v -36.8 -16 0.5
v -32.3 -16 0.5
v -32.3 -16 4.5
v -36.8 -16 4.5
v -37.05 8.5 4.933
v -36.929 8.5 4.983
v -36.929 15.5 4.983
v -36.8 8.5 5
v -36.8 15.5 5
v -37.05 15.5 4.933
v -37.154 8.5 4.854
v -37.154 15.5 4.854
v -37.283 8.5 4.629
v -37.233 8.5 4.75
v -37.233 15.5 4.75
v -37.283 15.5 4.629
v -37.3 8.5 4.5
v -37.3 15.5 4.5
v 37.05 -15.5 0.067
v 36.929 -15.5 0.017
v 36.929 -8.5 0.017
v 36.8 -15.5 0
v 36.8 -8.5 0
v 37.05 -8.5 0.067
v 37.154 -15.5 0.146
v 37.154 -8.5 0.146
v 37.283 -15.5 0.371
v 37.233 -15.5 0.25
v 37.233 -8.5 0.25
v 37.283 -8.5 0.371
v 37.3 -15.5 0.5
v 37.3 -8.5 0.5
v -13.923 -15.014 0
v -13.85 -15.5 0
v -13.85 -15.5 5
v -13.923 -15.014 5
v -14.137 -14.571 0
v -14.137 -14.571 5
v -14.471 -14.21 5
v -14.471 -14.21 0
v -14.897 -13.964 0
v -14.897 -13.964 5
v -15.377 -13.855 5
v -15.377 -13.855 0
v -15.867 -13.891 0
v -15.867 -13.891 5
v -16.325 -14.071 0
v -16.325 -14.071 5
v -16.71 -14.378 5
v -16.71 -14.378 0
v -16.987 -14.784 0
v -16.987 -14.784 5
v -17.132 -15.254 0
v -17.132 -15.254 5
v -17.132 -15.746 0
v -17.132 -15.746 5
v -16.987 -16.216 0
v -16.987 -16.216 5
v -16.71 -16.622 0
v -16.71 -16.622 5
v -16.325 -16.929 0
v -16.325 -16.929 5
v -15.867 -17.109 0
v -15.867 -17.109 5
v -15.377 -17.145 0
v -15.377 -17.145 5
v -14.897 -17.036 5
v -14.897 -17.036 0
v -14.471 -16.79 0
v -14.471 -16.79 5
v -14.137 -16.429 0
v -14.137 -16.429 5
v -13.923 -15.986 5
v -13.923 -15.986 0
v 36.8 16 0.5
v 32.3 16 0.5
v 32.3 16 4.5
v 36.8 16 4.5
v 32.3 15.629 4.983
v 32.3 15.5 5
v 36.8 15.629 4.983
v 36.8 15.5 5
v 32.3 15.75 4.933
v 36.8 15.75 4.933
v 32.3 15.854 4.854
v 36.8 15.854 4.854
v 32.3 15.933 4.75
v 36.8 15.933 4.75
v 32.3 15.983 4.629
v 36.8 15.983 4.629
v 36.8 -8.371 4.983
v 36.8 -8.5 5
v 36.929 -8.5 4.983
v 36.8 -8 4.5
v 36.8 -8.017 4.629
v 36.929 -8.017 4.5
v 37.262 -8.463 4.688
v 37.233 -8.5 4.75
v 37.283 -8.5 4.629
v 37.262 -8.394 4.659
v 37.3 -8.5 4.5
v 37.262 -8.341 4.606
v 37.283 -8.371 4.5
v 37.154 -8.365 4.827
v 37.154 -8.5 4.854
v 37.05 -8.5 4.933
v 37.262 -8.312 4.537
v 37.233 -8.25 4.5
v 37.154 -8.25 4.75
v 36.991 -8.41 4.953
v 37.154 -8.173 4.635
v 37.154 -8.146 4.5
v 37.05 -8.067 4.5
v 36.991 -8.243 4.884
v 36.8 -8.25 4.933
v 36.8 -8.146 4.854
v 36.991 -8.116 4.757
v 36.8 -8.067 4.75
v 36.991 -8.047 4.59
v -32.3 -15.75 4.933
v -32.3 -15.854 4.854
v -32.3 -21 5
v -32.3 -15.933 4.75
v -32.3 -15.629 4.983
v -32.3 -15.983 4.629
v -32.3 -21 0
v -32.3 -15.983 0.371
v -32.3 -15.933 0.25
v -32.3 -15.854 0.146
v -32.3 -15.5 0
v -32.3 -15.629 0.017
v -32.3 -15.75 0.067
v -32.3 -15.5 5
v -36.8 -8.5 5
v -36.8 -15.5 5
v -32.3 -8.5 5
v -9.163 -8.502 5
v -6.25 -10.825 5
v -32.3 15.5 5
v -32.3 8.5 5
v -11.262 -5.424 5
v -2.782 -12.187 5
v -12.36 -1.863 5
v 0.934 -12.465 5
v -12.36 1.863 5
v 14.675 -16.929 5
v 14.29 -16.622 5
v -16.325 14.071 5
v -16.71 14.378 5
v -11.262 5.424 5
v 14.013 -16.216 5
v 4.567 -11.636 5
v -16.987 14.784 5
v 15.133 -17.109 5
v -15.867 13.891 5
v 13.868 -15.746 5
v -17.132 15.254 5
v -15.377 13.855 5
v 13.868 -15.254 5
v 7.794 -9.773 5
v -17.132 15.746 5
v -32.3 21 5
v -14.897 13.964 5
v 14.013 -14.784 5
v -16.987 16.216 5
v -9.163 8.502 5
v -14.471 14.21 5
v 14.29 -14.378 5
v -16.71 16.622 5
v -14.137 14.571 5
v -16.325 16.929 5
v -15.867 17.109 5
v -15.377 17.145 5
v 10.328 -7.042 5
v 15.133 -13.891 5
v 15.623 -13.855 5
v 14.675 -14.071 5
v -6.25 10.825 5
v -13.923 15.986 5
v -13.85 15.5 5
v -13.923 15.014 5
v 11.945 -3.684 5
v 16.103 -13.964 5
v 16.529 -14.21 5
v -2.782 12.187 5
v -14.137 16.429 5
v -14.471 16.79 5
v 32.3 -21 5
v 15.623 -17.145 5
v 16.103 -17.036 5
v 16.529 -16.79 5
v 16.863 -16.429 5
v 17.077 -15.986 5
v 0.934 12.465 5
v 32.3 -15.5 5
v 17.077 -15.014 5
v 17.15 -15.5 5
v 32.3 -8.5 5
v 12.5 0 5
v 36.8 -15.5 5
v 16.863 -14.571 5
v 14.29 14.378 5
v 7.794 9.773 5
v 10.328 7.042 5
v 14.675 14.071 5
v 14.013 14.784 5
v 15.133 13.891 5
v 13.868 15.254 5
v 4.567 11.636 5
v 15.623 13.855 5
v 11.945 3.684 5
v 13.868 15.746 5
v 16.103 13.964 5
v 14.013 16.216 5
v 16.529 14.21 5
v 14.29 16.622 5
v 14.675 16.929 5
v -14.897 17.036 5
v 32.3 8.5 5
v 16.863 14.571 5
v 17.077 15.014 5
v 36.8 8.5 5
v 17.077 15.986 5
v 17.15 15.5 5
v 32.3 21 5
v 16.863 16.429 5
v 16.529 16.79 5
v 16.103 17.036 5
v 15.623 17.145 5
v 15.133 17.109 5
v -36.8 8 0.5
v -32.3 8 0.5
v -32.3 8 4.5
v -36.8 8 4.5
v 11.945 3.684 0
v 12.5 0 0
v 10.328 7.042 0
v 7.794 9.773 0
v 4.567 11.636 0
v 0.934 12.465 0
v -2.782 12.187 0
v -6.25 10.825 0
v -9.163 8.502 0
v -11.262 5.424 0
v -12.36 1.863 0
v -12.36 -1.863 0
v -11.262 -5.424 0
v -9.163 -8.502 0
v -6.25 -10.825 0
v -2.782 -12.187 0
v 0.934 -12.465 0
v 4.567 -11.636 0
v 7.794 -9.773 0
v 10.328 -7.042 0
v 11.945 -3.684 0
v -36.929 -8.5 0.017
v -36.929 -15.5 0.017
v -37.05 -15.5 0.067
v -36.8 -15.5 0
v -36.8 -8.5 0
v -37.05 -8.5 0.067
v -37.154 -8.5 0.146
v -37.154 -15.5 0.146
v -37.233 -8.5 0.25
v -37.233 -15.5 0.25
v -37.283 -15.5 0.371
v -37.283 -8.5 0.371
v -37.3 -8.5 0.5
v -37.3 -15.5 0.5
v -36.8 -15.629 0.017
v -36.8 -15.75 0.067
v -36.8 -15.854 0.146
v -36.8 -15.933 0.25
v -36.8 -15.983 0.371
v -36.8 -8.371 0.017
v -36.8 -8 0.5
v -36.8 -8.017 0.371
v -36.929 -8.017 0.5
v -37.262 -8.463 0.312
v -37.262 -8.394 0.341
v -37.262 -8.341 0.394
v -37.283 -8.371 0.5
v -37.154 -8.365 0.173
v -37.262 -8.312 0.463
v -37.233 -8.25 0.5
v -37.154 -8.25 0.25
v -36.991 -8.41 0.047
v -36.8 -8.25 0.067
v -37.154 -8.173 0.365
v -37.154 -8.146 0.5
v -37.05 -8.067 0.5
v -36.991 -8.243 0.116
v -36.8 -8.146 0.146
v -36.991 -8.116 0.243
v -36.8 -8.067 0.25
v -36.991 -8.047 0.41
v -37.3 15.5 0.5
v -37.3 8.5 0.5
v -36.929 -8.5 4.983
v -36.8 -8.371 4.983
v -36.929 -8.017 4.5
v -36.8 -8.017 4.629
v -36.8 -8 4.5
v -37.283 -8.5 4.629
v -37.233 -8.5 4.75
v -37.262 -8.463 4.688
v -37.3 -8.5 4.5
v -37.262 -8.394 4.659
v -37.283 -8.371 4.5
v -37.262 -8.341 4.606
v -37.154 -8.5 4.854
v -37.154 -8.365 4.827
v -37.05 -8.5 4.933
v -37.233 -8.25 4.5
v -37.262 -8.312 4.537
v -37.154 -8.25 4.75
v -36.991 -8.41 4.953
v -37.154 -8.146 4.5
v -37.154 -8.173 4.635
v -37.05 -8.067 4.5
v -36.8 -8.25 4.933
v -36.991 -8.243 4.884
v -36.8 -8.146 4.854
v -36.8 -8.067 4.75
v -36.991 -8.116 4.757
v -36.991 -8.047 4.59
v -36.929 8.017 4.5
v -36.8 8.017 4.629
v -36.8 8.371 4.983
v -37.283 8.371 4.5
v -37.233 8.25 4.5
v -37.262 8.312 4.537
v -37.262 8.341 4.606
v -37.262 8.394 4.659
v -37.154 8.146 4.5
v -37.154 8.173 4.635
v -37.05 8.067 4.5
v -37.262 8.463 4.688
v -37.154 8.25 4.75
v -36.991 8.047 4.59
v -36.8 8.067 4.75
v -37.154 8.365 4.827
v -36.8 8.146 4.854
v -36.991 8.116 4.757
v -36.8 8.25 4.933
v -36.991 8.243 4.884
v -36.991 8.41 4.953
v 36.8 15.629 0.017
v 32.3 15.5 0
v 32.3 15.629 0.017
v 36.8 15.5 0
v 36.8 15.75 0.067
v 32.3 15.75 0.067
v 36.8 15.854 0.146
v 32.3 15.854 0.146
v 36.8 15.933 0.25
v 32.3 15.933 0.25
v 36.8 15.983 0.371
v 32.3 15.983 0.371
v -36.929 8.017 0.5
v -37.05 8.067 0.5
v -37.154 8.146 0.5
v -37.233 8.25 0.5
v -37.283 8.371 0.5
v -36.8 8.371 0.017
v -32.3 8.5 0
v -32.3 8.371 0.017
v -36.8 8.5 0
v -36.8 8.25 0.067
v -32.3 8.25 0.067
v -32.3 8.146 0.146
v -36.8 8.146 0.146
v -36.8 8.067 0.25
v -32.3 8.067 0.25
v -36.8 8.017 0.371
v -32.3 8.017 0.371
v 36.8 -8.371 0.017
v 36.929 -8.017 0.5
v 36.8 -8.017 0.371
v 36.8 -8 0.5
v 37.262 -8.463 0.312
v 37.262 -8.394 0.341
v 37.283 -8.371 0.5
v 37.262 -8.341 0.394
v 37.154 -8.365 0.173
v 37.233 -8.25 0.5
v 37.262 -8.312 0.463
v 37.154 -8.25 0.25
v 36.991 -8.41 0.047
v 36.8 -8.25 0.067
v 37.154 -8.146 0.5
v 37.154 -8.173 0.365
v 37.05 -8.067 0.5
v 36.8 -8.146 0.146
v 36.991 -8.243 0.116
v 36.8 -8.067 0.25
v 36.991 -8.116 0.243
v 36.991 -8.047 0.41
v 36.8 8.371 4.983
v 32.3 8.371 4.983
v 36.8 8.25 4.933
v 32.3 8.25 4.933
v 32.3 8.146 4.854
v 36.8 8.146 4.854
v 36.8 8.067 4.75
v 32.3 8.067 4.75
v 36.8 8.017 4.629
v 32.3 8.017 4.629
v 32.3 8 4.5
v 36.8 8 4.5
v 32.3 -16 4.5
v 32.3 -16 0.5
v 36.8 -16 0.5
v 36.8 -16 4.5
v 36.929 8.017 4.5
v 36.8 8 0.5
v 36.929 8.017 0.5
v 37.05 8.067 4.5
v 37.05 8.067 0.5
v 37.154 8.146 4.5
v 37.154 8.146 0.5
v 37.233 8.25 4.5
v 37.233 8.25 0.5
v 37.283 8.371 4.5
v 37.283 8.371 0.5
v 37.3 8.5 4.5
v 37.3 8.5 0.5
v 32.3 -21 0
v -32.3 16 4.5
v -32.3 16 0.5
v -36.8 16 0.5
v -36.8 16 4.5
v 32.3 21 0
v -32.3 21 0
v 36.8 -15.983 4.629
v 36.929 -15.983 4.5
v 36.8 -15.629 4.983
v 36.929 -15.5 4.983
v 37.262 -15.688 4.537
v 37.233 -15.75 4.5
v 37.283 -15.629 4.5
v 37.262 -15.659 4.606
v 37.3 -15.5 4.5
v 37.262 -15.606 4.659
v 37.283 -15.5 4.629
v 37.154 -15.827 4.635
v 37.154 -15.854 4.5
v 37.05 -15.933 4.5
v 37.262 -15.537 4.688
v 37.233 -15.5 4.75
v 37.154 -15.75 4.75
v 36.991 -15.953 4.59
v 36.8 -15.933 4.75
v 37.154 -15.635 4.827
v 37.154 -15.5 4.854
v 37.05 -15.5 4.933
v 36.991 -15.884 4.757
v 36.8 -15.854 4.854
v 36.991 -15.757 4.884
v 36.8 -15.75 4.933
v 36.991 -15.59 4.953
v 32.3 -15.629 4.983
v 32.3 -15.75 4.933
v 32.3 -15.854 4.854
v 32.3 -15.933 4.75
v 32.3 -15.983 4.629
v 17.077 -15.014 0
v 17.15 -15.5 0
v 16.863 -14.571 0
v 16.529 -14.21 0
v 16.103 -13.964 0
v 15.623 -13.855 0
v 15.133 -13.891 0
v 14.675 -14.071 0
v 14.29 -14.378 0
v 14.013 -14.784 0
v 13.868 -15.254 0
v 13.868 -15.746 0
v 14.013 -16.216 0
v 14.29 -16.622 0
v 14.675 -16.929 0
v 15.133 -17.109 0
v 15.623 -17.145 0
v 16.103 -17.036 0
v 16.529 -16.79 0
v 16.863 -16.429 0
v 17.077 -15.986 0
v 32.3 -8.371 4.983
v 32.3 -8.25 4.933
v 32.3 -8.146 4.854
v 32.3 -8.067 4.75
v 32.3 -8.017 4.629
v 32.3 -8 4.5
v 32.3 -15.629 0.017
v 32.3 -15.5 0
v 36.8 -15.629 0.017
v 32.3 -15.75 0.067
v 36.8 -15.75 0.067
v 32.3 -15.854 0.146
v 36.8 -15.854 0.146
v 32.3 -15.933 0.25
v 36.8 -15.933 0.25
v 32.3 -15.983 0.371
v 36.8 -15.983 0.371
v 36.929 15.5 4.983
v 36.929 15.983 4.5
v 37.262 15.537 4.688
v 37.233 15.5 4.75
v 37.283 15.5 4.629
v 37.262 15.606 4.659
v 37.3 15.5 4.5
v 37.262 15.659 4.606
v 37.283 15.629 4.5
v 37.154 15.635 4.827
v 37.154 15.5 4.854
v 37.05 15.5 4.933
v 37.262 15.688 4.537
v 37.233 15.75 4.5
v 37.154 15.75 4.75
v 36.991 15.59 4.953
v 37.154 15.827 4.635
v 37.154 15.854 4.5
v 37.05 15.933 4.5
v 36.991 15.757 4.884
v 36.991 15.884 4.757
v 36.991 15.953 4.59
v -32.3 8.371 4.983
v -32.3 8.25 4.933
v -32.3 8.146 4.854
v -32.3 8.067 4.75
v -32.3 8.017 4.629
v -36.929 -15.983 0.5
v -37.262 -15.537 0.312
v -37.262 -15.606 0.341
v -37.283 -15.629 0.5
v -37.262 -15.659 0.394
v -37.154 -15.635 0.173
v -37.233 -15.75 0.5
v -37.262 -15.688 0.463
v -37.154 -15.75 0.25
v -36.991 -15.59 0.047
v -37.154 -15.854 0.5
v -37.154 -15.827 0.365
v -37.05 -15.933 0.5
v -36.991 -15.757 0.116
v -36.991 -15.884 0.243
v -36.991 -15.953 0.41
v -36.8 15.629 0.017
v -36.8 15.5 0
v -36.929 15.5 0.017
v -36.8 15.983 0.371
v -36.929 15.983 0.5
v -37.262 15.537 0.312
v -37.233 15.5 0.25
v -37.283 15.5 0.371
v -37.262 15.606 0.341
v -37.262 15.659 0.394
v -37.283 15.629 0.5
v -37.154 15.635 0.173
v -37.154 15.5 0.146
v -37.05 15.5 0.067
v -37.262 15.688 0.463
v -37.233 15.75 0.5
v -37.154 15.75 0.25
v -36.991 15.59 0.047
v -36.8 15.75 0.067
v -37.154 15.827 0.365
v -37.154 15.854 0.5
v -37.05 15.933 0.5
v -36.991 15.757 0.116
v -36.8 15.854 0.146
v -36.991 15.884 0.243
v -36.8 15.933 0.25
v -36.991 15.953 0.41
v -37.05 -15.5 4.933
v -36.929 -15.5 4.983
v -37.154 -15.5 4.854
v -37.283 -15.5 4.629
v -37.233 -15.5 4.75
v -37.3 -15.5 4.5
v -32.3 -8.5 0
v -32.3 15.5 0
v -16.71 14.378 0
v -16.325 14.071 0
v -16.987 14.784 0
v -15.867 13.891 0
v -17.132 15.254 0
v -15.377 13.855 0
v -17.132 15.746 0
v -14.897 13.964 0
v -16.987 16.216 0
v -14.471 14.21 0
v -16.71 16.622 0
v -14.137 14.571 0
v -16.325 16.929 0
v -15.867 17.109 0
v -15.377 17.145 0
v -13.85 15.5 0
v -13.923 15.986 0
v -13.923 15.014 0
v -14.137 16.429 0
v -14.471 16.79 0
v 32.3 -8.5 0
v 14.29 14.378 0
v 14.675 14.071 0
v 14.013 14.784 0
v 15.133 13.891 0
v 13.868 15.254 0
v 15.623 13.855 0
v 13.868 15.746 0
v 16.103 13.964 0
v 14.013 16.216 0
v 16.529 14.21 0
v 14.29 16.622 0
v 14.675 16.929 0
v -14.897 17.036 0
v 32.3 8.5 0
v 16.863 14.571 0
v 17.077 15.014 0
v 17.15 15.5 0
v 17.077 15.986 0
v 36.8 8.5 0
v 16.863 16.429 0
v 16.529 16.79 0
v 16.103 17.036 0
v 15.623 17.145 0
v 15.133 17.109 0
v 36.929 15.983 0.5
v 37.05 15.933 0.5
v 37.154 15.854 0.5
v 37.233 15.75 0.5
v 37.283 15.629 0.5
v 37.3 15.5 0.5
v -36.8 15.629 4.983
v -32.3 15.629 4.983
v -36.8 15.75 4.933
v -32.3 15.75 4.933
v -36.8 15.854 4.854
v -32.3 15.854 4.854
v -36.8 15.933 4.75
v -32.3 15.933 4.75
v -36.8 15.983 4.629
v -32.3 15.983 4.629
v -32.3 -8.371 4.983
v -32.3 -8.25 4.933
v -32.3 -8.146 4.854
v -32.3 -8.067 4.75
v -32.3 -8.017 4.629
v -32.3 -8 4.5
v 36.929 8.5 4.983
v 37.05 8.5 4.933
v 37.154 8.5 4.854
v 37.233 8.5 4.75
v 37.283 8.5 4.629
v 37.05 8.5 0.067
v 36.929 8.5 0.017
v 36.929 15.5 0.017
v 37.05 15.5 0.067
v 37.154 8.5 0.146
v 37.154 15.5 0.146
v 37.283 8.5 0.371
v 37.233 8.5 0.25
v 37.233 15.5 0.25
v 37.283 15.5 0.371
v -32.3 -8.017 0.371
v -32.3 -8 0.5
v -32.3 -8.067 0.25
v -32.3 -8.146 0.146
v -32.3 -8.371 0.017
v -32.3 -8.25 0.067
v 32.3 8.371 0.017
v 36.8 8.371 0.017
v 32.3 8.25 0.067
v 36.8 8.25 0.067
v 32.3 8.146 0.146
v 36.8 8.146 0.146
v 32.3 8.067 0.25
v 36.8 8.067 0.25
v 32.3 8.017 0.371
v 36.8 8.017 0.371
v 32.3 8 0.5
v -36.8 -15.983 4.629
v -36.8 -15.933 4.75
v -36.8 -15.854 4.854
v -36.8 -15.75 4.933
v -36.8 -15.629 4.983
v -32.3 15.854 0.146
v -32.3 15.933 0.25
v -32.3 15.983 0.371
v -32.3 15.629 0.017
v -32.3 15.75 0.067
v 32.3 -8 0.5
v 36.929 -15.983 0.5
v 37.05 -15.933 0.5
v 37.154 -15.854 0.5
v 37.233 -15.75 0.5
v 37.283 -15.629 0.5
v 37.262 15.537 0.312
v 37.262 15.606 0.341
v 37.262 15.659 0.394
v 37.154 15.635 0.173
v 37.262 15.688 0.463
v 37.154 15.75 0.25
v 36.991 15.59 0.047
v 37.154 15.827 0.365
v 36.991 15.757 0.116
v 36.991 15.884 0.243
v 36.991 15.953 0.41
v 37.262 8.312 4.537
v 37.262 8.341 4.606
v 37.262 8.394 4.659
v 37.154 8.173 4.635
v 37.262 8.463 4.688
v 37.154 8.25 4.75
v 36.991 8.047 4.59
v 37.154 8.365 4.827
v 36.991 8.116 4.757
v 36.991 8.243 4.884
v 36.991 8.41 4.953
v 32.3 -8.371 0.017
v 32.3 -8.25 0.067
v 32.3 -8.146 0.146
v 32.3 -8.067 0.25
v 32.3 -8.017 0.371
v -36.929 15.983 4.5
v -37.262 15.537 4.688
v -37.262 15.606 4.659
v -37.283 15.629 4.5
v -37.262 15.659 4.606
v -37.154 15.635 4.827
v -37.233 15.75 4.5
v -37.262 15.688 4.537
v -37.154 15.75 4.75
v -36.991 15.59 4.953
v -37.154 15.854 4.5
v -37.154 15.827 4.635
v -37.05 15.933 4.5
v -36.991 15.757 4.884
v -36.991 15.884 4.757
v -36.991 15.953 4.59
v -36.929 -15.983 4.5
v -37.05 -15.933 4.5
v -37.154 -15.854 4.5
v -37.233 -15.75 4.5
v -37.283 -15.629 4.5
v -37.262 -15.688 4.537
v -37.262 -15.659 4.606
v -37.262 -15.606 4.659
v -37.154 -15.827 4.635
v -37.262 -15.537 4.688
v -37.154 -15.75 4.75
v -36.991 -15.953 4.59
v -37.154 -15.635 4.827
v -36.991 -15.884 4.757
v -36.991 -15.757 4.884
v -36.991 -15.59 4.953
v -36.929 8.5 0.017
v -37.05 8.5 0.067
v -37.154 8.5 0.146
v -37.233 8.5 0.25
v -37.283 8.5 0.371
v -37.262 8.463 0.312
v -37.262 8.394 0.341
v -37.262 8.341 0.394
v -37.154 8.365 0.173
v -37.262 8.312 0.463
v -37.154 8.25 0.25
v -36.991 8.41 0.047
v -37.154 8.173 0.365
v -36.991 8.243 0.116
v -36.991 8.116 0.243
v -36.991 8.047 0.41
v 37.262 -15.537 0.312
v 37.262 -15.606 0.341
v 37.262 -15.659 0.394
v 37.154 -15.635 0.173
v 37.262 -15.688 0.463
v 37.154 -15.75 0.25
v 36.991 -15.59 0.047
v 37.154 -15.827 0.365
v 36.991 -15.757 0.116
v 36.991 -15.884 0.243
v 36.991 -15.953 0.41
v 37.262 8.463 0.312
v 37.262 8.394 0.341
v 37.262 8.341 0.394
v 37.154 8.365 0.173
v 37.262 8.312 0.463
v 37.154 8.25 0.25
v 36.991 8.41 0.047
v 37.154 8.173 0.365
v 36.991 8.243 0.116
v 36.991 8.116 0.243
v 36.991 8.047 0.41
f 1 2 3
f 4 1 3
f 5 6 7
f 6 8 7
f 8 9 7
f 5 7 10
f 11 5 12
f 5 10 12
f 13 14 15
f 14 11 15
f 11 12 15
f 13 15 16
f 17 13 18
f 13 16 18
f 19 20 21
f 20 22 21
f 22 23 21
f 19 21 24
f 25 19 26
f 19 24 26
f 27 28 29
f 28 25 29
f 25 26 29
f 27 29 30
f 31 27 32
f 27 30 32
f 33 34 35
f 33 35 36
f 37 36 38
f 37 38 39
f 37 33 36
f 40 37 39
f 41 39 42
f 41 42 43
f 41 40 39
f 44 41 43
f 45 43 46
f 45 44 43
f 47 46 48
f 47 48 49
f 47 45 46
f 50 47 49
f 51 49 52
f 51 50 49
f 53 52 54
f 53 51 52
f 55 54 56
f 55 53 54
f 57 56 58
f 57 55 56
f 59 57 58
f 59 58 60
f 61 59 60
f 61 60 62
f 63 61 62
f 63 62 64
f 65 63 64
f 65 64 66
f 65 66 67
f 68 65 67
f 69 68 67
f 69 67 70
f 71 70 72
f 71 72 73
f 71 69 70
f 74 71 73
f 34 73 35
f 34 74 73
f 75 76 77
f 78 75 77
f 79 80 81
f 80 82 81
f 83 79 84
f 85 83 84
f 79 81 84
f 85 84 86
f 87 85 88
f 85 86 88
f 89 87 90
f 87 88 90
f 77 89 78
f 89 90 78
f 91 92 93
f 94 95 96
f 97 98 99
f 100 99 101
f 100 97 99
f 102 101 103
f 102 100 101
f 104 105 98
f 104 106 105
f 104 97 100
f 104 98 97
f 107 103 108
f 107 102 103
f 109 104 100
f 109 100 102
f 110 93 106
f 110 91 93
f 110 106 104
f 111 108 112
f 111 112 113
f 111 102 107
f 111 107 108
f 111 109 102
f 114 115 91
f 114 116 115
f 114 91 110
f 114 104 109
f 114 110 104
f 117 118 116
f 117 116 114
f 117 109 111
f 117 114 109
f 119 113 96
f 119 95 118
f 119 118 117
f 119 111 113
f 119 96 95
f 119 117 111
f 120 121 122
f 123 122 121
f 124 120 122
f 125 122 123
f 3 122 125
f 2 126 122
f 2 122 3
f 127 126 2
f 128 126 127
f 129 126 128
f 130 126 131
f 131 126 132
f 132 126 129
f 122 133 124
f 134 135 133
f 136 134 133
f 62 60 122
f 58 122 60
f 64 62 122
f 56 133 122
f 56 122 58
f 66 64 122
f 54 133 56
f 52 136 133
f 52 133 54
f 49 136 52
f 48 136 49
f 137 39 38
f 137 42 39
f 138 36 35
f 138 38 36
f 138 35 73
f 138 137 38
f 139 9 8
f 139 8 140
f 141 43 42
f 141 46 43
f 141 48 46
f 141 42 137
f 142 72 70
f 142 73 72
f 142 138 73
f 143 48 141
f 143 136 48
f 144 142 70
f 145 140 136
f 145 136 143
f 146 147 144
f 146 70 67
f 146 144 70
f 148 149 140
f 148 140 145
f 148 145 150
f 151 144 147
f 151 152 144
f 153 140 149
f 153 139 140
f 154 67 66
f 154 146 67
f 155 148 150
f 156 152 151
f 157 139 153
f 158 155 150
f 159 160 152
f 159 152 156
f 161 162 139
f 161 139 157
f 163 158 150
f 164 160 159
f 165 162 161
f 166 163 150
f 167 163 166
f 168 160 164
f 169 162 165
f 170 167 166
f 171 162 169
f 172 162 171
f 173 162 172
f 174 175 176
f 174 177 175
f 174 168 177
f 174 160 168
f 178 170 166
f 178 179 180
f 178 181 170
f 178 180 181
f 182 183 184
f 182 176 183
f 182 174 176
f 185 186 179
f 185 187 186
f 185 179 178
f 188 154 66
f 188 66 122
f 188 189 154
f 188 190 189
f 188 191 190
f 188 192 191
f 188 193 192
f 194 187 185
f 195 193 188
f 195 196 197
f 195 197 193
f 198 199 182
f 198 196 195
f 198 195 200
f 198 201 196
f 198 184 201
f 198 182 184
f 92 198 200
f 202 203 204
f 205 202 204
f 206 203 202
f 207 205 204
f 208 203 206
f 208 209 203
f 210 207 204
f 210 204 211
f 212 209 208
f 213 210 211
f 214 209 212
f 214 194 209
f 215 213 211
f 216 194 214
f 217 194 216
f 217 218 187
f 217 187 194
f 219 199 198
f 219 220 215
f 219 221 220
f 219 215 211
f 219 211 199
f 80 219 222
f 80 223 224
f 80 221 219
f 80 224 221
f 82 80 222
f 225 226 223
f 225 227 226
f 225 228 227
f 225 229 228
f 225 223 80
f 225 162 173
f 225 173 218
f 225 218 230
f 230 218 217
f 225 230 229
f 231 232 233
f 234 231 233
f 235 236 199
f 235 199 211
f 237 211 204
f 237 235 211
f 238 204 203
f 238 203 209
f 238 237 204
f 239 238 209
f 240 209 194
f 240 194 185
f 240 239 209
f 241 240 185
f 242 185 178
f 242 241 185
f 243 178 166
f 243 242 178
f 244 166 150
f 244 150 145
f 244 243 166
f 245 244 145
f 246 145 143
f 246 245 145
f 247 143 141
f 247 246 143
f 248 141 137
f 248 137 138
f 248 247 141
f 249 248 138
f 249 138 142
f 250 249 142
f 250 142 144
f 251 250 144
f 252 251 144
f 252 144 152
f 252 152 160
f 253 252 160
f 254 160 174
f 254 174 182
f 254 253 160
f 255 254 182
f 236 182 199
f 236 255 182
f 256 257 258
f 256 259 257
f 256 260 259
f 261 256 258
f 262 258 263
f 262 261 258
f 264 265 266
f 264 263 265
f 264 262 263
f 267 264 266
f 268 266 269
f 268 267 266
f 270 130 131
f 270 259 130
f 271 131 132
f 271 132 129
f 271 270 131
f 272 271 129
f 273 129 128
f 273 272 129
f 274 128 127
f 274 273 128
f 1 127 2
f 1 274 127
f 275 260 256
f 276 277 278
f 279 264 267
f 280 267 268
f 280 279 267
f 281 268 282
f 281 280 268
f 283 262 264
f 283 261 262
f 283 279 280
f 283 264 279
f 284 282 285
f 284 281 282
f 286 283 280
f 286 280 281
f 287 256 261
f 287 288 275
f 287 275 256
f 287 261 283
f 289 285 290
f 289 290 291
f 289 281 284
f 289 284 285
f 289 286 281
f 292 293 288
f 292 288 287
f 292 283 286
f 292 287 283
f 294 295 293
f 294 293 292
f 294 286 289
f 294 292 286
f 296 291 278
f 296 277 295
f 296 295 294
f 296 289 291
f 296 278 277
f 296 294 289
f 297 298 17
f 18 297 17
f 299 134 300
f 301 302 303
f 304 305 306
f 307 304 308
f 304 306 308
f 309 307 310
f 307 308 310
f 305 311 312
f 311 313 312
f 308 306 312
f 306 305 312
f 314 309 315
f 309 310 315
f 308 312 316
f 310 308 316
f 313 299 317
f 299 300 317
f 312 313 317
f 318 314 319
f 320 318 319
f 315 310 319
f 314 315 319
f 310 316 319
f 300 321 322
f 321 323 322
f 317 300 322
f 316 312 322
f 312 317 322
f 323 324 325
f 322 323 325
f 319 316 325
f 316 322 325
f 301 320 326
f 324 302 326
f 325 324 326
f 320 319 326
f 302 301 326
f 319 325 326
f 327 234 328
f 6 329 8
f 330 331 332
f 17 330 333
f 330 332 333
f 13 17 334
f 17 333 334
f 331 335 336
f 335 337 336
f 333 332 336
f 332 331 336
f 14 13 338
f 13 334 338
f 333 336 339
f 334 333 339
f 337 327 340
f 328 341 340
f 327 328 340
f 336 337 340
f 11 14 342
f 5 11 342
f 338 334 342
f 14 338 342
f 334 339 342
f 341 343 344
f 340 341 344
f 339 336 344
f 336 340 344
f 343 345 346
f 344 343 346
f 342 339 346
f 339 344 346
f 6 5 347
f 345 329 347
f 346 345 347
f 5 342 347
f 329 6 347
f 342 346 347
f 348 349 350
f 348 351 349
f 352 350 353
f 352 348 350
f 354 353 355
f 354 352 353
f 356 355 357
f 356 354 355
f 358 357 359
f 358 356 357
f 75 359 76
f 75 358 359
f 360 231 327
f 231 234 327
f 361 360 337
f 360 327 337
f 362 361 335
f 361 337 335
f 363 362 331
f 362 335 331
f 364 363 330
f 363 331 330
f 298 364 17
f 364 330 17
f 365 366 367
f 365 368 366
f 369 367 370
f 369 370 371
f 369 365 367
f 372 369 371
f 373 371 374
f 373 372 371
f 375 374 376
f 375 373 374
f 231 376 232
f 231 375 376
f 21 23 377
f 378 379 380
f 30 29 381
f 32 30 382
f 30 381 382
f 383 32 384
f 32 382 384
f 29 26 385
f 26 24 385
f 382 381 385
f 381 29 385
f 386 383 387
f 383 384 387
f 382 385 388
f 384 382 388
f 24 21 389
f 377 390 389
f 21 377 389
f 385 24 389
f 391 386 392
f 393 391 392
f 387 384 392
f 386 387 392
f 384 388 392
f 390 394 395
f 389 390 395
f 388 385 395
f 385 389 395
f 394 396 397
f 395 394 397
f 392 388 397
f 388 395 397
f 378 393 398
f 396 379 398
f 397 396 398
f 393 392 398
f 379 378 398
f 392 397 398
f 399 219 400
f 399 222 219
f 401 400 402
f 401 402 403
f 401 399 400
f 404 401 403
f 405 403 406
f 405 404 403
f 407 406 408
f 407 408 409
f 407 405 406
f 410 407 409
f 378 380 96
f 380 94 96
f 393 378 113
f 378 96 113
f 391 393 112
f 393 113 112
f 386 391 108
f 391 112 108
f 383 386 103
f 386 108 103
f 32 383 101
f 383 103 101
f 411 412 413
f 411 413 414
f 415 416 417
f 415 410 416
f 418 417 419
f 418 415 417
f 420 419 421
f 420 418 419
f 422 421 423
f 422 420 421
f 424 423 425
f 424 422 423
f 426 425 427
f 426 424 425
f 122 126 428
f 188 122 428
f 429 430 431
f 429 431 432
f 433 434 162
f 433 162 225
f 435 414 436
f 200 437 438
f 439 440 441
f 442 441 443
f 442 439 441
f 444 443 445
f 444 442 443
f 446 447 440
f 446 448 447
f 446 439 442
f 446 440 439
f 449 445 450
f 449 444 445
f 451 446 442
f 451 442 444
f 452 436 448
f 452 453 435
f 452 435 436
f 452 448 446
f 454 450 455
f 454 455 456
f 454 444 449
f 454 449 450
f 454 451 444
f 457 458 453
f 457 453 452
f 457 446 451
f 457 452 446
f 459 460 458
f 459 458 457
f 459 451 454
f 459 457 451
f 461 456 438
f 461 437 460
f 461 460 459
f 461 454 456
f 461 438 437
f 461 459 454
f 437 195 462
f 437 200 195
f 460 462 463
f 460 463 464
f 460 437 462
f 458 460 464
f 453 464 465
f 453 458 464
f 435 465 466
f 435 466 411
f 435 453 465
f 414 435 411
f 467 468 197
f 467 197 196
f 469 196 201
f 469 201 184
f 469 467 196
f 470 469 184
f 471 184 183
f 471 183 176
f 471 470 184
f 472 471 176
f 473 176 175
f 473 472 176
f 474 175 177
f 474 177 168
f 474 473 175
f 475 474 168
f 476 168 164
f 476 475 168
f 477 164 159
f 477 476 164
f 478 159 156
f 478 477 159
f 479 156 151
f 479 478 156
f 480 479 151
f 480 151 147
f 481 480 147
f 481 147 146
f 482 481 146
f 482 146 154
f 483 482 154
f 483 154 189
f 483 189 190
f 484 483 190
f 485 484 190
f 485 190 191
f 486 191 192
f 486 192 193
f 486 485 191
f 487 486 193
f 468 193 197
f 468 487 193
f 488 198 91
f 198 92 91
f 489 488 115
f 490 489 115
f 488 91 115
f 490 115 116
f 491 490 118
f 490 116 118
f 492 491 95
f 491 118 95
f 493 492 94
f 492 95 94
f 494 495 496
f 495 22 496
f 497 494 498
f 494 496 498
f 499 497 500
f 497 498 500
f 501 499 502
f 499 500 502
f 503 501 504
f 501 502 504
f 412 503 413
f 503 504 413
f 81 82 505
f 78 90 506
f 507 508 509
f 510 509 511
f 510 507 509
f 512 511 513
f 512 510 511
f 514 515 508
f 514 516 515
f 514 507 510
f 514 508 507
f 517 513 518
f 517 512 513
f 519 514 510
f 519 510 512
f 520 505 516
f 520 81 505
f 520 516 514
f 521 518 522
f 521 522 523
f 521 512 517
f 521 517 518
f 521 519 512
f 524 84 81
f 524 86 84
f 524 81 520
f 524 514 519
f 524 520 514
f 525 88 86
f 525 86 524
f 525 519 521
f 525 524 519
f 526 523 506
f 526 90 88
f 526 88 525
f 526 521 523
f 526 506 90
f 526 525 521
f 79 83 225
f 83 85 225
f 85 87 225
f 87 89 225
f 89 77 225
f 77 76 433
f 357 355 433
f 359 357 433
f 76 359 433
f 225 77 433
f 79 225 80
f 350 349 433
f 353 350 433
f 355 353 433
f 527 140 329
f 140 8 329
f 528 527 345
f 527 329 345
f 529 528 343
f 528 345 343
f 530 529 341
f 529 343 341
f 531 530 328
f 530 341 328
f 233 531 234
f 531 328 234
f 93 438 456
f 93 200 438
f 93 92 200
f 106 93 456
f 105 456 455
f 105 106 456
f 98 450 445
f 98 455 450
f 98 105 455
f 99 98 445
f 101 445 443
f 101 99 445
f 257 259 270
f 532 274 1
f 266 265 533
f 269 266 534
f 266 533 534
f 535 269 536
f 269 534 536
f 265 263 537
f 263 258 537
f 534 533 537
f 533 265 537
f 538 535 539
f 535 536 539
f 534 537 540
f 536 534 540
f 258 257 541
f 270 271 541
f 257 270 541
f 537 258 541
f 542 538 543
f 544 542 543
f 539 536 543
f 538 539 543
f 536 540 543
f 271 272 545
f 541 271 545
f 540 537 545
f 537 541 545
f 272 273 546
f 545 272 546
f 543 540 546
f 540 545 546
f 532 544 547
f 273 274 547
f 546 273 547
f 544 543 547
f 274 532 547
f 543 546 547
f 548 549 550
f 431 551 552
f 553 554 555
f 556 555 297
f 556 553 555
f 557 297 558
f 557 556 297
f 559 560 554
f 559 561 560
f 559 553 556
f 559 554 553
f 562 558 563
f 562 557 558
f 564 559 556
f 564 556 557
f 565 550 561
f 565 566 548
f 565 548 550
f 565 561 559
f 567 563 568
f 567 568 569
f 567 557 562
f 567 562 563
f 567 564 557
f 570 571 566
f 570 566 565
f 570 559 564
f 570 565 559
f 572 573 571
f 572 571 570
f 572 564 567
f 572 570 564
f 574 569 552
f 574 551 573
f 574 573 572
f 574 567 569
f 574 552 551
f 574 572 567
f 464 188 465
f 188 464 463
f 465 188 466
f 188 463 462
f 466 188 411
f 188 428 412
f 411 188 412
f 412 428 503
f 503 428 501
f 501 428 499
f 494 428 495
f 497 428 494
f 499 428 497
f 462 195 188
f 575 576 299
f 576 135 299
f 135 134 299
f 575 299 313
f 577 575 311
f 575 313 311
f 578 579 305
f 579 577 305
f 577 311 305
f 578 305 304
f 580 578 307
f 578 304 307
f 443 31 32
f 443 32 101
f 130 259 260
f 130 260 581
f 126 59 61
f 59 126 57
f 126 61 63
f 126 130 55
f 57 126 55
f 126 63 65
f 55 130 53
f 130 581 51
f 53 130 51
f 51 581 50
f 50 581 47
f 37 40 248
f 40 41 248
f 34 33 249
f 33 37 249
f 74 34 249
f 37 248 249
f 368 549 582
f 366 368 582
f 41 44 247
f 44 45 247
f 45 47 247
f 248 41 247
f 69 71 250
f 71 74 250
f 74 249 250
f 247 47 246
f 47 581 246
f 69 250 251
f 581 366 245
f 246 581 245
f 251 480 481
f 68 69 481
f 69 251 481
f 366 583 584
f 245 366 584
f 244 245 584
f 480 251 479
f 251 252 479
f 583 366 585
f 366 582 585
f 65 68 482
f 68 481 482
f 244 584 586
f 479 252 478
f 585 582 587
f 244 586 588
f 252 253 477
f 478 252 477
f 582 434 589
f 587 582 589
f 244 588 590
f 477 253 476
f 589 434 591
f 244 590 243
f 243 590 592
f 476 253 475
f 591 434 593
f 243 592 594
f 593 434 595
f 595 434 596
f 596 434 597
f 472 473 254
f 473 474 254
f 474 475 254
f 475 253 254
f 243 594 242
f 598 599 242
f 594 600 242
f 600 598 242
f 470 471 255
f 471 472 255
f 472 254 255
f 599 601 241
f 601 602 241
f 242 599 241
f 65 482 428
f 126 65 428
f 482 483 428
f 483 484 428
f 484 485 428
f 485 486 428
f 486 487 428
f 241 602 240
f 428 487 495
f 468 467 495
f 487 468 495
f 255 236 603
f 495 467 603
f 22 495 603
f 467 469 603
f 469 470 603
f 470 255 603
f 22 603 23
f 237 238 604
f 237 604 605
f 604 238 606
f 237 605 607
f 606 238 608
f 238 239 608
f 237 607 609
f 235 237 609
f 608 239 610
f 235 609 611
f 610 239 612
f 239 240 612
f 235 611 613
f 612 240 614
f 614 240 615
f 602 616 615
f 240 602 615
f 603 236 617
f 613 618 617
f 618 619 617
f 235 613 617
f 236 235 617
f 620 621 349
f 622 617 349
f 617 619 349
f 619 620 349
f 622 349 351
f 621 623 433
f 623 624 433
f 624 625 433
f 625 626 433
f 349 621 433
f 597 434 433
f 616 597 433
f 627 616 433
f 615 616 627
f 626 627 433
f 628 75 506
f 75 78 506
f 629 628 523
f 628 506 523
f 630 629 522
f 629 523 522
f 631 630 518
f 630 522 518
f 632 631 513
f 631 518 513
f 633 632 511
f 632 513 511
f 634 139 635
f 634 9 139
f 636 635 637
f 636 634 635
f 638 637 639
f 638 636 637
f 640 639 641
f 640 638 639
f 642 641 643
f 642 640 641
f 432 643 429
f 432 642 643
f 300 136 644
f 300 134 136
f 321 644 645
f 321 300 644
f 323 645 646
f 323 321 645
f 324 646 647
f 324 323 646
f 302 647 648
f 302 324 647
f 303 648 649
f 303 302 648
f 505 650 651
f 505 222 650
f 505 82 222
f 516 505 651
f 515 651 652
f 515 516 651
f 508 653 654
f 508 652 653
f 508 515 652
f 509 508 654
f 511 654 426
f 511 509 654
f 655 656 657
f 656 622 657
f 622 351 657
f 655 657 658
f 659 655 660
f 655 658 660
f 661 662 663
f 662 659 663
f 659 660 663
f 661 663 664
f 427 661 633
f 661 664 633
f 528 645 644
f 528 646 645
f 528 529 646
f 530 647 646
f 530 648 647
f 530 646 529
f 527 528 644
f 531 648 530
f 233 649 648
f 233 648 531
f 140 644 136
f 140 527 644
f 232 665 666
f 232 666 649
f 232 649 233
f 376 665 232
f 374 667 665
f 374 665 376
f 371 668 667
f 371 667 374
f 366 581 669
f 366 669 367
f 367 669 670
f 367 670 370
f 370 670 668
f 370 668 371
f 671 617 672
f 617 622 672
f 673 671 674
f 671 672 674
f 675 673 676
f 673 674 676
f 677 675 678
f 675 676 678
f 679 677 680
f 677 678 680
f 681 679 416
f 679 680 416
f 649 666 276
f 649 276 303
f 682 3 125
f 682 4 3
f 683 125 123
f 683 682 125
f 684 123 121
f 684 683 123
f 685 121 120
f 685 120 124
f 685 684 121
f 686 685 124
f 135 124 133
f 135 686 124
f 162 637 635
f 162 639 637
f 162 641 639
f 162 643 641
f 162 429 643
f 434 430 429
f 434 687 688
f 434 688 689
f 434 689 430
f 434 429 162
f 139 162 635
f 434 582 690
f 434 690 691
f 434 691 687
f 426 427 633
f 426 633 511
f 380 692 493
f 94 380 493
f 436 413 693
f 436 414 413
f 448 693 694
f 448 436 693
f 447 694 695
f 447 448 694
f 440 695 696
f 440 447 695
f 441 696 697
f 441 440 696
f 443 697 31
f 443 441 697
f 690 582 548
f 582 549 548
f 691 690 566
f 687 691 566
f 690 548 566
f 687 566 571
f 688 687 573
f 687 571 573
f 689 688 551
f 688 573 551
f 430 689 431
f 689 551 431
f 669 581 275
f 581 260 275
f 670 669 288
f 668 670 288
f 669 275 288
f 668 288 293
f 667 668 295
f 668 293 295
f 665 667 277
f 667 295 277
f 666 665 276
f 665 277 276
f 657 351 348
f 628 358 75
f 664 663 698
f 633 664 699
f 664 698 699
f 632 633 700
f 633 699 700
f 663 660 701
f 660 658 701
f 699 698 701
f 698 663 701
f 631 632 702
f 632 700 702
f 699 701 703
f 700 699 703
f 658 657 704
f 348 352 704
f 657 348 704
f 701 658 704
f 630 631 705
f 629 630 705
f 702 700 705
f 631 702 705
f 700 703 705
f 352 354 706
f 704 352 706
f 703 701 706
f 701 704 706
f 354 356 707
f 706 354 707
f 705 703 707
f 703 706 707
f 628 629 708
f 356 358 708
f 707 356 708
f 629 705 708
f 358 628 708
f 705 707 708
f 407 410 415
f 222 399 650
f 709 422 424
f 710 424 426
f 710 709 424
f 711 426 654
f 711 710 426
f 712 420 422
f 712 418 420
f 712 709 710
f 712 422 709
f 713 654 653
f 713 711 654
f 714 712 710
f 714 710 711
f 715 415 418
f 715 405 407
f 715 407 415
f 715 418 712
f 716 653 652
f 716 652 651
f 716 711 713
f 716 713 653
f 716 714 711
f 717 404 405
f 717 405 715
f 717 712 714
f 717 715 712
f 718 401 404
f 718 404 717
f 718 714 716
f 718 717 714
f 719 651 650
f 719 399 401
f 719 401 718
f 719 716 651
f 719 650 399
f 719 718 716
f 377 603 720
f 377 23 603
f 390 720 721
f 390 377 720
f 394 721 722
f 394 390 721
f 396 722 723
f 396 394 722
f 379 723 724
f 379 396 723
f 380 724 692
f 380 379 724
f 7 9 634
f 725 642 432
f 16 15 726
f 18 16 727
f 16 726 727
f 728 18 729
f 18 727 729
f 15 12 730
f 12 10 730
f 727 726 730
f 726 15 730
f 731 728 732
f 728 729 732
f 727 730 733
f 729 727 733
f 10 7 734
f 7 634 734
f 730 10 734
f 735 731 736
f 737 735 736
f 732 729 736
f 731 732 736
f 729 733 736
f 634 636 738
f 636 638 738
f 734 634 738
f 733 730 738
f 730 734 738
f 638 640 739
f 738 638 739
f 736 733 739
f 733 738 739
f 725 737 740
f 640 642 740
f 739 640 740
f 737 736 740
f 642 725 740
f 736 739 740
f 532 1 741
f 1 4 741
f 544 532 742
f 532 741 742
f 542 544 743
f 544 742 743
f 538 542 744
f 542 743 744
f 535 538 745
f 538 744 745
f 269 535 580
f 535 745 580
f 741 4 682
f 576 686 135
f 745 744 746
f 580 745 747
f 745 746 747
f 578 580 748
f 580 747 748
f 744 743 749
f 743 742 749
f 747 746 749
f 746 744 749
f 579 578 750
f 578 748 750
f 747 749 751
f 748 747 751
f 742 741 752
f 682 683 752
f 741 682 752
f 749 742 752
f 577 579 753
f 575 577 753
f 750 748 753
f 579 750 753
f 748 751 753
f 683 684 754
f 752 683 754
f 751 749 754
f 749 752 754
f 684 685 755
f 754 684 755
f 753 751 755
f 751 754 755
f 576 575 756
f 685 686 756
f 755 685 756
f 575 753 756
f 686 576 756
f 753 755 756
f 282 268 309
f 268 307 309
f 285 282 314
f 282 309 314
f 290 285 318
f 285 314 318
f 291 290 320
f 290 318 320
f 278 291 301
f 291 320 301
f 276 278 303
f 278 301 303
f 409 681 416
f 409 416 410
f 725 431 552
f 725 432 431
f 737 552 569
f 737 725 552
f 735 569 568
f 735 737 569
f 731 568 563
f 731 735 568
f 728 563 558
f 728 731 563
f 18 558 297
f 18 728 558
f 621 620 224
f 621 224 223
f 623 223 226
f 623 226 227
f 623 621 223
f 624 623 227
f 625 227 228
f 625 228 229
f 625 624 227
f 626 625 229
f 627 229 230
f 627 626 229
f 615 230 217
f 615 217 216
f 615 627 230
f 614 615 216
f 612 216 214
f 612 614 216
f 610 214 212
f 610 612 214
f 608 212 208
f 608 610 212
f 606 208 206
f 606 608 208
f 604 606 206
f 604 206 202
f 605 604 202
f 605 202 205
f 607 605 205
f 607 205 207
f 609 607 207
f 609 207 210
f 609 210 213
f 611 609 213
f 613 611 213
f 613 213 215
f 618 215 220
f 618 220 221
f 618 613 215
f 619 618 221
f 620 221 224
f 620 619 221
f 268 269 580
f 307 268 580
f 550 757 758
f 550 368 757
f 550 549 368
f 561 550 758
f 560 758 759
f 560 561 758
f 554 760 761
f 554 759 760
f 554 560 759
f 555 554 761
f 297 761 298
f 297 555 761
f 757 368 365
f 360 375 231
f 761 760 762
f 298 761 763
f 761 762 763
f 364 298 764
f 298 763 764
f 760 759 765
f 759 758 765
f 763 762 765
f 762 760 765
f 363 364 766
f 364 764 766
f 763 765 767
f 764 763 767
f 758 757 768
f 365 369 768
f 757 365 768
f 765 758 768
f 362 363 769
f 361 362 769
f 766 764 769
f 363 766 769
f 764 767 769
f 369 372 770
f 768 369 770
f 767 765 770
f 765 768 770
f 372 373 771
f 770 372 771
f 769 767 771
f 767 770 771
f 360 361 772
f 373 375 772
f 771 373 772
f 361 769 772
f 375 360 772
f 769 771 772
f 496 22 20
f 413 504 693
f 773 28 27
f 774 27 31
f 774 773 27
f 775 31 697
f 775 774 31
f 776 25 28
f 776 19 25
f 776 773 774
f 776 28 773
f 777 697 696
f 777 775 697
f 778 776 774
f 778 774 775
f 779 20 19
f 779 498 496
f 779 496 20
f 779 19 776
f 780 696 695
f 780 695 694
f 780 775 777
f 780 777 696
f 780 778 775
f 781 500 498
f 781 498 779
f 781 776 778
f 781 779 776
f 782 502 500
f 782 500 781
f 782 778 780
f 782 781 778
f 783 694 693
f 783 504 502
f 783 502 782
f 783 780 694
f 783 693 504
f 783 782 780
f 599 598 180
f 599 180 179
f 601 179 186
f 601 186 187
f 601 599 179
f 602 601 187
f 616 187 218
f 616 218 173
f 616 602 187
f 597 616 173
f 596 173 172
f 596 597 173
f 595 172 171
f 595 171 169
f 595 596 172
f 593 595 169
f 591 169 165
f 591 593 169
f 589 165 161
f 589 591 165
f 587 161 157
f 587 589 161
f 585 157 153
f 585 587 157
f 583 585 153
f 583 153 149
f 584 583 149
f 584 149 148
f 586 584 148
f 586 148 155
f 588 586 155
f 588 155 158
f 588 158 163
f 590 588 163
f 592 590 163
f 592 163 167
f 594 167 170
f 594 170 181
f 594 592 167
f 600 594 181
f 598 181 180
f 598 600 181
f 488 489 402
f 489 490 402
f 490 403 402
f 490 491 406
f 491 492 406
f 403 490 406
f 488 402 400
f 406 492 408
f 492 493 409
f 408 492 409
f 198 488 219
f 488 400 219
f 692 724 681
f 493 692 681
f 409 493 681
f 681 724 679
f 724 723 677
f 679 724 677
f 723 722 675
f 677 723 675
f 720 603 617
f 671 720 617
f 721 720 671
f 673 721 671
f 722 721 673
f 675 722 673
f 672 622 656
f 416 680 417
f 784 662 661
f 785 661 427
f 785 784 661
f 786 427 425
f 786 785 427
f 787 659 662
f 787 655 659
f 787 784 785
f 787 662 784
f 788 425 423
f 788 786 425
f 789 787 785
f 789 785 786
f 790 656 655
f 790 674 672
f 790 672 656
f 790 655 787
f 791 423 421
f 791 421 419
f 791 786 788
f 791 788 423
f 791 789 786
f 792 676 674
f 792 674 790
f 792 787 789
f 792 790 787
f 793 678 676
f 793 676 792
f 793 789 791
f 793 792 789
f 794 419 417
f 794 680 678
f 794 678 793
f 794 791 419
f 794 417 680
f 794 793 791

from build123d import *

# Parameters (mm, degrees)
CROQUIS1_W               = 64.6
CROQUIS1_H               = 42
CROQUIS1_R               = 1.65
CROQUIS1_R_2             = 12.5
SALIENTE_EXTRUIR1_DEPTH  = 5
CROQUIS2_W               = 5
CROQUIS2_H               = 8
SALIENTE_EXTRUIR2_DEPTH  = 5
REDONDEO1_R              = 0.5
REDONDEO1_OF_SIMETR_A1_R = 0.5


with BuildPart() as part:
    # Croquis1 → Saliente-Extruir1 (new body)
    with BuildSketch(Plane.XY):
        Rectangle(CROQUIS1_W, CROQUIS1_H)
        with Locations((-15.5, 15.5)):
            Circle(CROQUIS1_R, mode=Mode.SUBTRACT)
        with Locations((15.5, 15.5)):
            Circle(CROQUIS1_R, mode=Mode.SUBTRACT)
        Circle(CROQUIS1_R_2, mode=Mode.SUBTRACT)
        with Locations((-15.5, -15.5)):
            Circle(CROQUIS1_R, mode=Mode.SUBTRACT)
        with Locations((15.5, -15.5)):
            Circle(CROQUIS1_R, mode=Mode.SUBTRACT)
    extrude(amount=SALIENTE_EXTRUIR1_DEPTH)

    # Croquis2 → Saliente-Extruir2 (add)
    with BuildSketch(Plane.ZY.offset(32.3)):
        with Locations((2.5, 12)):
            Rectangle(CROQUIS2_W, CROQUIS2_H)
        with Locations((2.5, -12)):
            Rectangle(CROQUIS2_W, CROQUIS2_H)
    saliente_extruir2 = extrude(amount=SALIENTE_EXTRUIR2_DEPTH)

    # Redondeo1
    redondeo1_edges = [part.edges().sort_by_distance(p)[0] for p in [
        (-34.8, 16, 0),
        (-34.8, 8, 0),
        (-34.8, 8, 5),
        (-34.8, 16, 5),
        (-37.3, 12, 0),
        (-37.3, 8, 2.5),
        (-37.3, 12, 5),
        (-37.3, 16, 2.5),
        (-34.8, -8, 0),
        (-34.8, -16, 0),
        (-34.8, -16, 5),
        (-34.8, -8, 5),
        (-37.3, -12, 0),
        (-37.3, -16, 2.5),
        (-37.3, -12, 5),
        (-37.3, -8, 2.5),
    ]]
    fillet(redondeo1_edges, radius=REDONDEO1_R)

    # Simetría1: Saliente-Extruir2 across plane
    add(saliente_extruir2.mirror(Plane(origin=(0, 0, 0), x_dir=(0, 0, 1), z_dir=(1, 0, 0))))

    # Redondeo1 of Simetría1
    redondeo1_of_simetr_a1_edges = [part.edges().sort_by_distance(p)[0] for p in [
        (34.8, 16, 0),
        (34.8, 8, 0),
        (34.8, 8, 5),
        (34.8, 16, 5),
        (37.3, 12, 0),
        (37.3, 8, 2.5),
        (37.3, 12, 5),
        (37.3, 16, 2.5),
        (34.8, -8, 0),
        (34.8, -16, 0),
        (34.8, -16, 5),
        (34.8, -8, 5),
        (37.3, -12, 0),
        (37.3, -16, 2.5),
        (37.3, -12, 5),
        (37.3, -8, 2.5),
    ]]
    fillet(redondeo1_of_simetr_a1_edges, radius=REDONDEO1_OF_SIMETR_A1_R)


solid = part.part
